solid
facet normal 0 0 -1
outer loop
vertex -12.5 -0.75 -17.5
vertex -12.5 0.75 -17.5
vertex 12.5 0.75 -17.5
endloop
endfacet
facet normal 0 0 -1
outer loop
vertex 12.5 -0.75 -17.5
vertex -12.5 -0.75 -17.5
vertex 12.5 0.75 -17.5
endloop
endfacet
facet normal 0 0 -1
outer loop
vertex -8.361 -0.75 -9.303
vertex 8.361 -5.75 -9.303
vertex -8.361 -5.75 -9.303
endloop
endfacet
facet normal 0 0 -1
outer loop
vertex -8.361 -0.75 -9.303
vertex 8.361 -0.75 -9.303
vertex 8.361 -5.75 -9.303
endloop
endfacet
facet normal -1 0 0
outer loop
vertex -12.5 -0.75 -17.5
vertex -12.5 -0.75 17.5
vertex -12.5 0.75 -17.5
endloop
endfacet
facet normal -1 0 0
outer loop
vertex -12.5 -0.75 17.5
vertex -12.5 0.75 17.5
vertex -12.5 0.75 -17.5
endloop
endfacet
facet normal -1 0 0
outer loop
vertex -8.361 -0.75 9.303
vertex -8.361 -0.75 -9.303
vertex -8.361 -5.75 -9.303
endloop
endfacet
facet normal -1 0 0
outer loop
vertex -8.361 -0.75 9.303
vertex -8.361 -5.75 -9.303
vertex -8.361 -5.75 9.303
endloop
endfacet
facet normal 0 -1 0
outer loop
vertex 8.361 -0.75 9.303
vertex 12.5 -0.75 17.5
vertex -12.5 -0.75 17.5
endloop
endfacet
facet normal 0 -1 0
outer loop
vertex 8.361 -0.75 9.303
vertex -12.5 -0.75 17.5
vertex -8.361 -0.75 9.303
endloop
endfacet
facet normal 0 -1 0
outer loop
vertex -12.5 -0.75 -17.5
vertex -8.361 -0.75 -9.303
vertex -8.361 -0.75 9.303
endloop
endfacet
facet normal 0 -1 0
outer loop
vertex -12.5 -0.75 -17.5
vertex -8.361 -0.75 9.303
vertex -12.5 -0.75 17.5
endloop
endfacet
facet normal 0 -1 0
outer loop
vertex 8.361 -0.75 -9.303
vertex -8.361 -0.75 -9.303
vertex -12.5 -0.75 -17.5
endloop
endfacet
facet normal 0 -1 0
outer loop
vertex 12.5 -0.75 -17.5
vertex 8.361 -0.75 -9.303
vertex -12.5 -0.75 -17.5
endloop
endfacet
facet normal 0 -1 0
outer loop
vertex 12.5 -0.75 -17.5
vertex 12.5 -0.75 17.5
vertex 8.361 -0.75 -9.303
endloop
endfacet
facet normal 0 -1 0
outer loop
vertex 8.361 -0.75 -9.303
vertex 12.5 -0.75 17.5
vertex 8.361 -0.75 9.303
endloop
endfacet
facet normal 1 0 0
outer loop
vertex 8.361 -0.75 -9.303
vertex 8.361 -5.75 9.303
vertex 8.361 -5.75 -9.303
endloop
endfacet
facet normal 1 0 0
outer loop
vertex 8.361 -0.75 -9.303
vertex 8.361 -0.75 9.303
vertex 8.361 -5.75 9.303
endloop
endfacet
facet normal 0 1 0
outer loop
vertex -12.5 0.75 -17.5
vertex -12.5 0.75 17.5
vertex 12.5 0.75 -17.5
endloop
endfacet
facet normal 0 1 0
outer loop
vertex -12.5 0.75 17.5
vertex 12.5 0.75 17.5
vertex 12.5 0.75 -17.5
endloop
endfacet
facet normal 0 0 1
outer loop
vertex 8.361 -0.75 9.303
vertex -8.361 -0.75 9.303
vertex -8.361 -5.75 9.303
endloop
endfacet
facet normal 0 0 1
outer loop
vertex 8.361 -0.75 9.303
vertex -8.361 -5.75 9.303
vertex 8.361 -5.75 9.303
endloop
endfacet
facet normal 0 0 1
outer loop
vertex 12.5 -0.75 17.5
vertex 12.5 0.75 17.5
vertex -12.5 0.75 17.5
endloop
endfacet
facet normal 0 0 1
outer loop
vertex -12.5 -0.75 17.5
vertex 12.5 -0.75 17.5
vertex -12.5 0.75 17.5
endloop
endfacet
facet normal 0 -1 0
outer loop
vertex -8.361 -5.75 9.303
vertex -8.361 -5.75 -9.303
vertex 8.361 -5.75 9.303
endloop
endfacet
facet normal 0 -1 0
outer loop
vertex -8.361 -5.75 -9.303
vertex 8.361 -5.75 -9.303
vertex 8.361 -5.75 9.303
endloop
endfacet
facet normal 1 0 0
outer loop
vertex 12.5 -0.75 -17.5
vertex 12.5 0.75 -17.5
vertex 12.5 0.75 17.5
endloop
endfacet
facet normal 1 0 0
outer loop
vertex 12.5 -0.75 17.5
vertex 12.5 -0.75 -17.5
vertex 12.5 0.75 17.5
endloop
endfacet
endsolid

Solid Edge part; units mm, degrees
sketch "Sketch1" plane through (0, 0, 0) normal (0, -1, 0) x (1, 0, 0)
  line L0 (-12.5, -17.5) -> (12.5, -17.5)
  line L1 (12.5, -17.5) -> (12.5, 17.5)
  line L2 (12.5, 17.5) -> (-12.5, 17.5)
  line L3 (-12.5, 17.5) -> (-12.5, -17.5)
extrude "Protrusion1" add sketch "Sketch1" along normal mid plane 1.5
sketch "Sketch2" plane through (0, -0.75, 0) normal (0, -1, 0) x (1, 0, 0)
  line L0 (8.3607, -9.3028) -> (-8.3607, -9.3028)
  line L1 (-8.3607, -9.3028) -> (-8.3607, 9.3028)
  line L2 (-8.3607, 9.3028) -> (8.3607, 9.3028)
  line L3 (8.3607, 9.3028) -> (8.3607, -9.3028)
extrude "ExtrudedProtrusion_3" add sketch "Sketch2" along normal blind 5 and the other way blind 0.6492
